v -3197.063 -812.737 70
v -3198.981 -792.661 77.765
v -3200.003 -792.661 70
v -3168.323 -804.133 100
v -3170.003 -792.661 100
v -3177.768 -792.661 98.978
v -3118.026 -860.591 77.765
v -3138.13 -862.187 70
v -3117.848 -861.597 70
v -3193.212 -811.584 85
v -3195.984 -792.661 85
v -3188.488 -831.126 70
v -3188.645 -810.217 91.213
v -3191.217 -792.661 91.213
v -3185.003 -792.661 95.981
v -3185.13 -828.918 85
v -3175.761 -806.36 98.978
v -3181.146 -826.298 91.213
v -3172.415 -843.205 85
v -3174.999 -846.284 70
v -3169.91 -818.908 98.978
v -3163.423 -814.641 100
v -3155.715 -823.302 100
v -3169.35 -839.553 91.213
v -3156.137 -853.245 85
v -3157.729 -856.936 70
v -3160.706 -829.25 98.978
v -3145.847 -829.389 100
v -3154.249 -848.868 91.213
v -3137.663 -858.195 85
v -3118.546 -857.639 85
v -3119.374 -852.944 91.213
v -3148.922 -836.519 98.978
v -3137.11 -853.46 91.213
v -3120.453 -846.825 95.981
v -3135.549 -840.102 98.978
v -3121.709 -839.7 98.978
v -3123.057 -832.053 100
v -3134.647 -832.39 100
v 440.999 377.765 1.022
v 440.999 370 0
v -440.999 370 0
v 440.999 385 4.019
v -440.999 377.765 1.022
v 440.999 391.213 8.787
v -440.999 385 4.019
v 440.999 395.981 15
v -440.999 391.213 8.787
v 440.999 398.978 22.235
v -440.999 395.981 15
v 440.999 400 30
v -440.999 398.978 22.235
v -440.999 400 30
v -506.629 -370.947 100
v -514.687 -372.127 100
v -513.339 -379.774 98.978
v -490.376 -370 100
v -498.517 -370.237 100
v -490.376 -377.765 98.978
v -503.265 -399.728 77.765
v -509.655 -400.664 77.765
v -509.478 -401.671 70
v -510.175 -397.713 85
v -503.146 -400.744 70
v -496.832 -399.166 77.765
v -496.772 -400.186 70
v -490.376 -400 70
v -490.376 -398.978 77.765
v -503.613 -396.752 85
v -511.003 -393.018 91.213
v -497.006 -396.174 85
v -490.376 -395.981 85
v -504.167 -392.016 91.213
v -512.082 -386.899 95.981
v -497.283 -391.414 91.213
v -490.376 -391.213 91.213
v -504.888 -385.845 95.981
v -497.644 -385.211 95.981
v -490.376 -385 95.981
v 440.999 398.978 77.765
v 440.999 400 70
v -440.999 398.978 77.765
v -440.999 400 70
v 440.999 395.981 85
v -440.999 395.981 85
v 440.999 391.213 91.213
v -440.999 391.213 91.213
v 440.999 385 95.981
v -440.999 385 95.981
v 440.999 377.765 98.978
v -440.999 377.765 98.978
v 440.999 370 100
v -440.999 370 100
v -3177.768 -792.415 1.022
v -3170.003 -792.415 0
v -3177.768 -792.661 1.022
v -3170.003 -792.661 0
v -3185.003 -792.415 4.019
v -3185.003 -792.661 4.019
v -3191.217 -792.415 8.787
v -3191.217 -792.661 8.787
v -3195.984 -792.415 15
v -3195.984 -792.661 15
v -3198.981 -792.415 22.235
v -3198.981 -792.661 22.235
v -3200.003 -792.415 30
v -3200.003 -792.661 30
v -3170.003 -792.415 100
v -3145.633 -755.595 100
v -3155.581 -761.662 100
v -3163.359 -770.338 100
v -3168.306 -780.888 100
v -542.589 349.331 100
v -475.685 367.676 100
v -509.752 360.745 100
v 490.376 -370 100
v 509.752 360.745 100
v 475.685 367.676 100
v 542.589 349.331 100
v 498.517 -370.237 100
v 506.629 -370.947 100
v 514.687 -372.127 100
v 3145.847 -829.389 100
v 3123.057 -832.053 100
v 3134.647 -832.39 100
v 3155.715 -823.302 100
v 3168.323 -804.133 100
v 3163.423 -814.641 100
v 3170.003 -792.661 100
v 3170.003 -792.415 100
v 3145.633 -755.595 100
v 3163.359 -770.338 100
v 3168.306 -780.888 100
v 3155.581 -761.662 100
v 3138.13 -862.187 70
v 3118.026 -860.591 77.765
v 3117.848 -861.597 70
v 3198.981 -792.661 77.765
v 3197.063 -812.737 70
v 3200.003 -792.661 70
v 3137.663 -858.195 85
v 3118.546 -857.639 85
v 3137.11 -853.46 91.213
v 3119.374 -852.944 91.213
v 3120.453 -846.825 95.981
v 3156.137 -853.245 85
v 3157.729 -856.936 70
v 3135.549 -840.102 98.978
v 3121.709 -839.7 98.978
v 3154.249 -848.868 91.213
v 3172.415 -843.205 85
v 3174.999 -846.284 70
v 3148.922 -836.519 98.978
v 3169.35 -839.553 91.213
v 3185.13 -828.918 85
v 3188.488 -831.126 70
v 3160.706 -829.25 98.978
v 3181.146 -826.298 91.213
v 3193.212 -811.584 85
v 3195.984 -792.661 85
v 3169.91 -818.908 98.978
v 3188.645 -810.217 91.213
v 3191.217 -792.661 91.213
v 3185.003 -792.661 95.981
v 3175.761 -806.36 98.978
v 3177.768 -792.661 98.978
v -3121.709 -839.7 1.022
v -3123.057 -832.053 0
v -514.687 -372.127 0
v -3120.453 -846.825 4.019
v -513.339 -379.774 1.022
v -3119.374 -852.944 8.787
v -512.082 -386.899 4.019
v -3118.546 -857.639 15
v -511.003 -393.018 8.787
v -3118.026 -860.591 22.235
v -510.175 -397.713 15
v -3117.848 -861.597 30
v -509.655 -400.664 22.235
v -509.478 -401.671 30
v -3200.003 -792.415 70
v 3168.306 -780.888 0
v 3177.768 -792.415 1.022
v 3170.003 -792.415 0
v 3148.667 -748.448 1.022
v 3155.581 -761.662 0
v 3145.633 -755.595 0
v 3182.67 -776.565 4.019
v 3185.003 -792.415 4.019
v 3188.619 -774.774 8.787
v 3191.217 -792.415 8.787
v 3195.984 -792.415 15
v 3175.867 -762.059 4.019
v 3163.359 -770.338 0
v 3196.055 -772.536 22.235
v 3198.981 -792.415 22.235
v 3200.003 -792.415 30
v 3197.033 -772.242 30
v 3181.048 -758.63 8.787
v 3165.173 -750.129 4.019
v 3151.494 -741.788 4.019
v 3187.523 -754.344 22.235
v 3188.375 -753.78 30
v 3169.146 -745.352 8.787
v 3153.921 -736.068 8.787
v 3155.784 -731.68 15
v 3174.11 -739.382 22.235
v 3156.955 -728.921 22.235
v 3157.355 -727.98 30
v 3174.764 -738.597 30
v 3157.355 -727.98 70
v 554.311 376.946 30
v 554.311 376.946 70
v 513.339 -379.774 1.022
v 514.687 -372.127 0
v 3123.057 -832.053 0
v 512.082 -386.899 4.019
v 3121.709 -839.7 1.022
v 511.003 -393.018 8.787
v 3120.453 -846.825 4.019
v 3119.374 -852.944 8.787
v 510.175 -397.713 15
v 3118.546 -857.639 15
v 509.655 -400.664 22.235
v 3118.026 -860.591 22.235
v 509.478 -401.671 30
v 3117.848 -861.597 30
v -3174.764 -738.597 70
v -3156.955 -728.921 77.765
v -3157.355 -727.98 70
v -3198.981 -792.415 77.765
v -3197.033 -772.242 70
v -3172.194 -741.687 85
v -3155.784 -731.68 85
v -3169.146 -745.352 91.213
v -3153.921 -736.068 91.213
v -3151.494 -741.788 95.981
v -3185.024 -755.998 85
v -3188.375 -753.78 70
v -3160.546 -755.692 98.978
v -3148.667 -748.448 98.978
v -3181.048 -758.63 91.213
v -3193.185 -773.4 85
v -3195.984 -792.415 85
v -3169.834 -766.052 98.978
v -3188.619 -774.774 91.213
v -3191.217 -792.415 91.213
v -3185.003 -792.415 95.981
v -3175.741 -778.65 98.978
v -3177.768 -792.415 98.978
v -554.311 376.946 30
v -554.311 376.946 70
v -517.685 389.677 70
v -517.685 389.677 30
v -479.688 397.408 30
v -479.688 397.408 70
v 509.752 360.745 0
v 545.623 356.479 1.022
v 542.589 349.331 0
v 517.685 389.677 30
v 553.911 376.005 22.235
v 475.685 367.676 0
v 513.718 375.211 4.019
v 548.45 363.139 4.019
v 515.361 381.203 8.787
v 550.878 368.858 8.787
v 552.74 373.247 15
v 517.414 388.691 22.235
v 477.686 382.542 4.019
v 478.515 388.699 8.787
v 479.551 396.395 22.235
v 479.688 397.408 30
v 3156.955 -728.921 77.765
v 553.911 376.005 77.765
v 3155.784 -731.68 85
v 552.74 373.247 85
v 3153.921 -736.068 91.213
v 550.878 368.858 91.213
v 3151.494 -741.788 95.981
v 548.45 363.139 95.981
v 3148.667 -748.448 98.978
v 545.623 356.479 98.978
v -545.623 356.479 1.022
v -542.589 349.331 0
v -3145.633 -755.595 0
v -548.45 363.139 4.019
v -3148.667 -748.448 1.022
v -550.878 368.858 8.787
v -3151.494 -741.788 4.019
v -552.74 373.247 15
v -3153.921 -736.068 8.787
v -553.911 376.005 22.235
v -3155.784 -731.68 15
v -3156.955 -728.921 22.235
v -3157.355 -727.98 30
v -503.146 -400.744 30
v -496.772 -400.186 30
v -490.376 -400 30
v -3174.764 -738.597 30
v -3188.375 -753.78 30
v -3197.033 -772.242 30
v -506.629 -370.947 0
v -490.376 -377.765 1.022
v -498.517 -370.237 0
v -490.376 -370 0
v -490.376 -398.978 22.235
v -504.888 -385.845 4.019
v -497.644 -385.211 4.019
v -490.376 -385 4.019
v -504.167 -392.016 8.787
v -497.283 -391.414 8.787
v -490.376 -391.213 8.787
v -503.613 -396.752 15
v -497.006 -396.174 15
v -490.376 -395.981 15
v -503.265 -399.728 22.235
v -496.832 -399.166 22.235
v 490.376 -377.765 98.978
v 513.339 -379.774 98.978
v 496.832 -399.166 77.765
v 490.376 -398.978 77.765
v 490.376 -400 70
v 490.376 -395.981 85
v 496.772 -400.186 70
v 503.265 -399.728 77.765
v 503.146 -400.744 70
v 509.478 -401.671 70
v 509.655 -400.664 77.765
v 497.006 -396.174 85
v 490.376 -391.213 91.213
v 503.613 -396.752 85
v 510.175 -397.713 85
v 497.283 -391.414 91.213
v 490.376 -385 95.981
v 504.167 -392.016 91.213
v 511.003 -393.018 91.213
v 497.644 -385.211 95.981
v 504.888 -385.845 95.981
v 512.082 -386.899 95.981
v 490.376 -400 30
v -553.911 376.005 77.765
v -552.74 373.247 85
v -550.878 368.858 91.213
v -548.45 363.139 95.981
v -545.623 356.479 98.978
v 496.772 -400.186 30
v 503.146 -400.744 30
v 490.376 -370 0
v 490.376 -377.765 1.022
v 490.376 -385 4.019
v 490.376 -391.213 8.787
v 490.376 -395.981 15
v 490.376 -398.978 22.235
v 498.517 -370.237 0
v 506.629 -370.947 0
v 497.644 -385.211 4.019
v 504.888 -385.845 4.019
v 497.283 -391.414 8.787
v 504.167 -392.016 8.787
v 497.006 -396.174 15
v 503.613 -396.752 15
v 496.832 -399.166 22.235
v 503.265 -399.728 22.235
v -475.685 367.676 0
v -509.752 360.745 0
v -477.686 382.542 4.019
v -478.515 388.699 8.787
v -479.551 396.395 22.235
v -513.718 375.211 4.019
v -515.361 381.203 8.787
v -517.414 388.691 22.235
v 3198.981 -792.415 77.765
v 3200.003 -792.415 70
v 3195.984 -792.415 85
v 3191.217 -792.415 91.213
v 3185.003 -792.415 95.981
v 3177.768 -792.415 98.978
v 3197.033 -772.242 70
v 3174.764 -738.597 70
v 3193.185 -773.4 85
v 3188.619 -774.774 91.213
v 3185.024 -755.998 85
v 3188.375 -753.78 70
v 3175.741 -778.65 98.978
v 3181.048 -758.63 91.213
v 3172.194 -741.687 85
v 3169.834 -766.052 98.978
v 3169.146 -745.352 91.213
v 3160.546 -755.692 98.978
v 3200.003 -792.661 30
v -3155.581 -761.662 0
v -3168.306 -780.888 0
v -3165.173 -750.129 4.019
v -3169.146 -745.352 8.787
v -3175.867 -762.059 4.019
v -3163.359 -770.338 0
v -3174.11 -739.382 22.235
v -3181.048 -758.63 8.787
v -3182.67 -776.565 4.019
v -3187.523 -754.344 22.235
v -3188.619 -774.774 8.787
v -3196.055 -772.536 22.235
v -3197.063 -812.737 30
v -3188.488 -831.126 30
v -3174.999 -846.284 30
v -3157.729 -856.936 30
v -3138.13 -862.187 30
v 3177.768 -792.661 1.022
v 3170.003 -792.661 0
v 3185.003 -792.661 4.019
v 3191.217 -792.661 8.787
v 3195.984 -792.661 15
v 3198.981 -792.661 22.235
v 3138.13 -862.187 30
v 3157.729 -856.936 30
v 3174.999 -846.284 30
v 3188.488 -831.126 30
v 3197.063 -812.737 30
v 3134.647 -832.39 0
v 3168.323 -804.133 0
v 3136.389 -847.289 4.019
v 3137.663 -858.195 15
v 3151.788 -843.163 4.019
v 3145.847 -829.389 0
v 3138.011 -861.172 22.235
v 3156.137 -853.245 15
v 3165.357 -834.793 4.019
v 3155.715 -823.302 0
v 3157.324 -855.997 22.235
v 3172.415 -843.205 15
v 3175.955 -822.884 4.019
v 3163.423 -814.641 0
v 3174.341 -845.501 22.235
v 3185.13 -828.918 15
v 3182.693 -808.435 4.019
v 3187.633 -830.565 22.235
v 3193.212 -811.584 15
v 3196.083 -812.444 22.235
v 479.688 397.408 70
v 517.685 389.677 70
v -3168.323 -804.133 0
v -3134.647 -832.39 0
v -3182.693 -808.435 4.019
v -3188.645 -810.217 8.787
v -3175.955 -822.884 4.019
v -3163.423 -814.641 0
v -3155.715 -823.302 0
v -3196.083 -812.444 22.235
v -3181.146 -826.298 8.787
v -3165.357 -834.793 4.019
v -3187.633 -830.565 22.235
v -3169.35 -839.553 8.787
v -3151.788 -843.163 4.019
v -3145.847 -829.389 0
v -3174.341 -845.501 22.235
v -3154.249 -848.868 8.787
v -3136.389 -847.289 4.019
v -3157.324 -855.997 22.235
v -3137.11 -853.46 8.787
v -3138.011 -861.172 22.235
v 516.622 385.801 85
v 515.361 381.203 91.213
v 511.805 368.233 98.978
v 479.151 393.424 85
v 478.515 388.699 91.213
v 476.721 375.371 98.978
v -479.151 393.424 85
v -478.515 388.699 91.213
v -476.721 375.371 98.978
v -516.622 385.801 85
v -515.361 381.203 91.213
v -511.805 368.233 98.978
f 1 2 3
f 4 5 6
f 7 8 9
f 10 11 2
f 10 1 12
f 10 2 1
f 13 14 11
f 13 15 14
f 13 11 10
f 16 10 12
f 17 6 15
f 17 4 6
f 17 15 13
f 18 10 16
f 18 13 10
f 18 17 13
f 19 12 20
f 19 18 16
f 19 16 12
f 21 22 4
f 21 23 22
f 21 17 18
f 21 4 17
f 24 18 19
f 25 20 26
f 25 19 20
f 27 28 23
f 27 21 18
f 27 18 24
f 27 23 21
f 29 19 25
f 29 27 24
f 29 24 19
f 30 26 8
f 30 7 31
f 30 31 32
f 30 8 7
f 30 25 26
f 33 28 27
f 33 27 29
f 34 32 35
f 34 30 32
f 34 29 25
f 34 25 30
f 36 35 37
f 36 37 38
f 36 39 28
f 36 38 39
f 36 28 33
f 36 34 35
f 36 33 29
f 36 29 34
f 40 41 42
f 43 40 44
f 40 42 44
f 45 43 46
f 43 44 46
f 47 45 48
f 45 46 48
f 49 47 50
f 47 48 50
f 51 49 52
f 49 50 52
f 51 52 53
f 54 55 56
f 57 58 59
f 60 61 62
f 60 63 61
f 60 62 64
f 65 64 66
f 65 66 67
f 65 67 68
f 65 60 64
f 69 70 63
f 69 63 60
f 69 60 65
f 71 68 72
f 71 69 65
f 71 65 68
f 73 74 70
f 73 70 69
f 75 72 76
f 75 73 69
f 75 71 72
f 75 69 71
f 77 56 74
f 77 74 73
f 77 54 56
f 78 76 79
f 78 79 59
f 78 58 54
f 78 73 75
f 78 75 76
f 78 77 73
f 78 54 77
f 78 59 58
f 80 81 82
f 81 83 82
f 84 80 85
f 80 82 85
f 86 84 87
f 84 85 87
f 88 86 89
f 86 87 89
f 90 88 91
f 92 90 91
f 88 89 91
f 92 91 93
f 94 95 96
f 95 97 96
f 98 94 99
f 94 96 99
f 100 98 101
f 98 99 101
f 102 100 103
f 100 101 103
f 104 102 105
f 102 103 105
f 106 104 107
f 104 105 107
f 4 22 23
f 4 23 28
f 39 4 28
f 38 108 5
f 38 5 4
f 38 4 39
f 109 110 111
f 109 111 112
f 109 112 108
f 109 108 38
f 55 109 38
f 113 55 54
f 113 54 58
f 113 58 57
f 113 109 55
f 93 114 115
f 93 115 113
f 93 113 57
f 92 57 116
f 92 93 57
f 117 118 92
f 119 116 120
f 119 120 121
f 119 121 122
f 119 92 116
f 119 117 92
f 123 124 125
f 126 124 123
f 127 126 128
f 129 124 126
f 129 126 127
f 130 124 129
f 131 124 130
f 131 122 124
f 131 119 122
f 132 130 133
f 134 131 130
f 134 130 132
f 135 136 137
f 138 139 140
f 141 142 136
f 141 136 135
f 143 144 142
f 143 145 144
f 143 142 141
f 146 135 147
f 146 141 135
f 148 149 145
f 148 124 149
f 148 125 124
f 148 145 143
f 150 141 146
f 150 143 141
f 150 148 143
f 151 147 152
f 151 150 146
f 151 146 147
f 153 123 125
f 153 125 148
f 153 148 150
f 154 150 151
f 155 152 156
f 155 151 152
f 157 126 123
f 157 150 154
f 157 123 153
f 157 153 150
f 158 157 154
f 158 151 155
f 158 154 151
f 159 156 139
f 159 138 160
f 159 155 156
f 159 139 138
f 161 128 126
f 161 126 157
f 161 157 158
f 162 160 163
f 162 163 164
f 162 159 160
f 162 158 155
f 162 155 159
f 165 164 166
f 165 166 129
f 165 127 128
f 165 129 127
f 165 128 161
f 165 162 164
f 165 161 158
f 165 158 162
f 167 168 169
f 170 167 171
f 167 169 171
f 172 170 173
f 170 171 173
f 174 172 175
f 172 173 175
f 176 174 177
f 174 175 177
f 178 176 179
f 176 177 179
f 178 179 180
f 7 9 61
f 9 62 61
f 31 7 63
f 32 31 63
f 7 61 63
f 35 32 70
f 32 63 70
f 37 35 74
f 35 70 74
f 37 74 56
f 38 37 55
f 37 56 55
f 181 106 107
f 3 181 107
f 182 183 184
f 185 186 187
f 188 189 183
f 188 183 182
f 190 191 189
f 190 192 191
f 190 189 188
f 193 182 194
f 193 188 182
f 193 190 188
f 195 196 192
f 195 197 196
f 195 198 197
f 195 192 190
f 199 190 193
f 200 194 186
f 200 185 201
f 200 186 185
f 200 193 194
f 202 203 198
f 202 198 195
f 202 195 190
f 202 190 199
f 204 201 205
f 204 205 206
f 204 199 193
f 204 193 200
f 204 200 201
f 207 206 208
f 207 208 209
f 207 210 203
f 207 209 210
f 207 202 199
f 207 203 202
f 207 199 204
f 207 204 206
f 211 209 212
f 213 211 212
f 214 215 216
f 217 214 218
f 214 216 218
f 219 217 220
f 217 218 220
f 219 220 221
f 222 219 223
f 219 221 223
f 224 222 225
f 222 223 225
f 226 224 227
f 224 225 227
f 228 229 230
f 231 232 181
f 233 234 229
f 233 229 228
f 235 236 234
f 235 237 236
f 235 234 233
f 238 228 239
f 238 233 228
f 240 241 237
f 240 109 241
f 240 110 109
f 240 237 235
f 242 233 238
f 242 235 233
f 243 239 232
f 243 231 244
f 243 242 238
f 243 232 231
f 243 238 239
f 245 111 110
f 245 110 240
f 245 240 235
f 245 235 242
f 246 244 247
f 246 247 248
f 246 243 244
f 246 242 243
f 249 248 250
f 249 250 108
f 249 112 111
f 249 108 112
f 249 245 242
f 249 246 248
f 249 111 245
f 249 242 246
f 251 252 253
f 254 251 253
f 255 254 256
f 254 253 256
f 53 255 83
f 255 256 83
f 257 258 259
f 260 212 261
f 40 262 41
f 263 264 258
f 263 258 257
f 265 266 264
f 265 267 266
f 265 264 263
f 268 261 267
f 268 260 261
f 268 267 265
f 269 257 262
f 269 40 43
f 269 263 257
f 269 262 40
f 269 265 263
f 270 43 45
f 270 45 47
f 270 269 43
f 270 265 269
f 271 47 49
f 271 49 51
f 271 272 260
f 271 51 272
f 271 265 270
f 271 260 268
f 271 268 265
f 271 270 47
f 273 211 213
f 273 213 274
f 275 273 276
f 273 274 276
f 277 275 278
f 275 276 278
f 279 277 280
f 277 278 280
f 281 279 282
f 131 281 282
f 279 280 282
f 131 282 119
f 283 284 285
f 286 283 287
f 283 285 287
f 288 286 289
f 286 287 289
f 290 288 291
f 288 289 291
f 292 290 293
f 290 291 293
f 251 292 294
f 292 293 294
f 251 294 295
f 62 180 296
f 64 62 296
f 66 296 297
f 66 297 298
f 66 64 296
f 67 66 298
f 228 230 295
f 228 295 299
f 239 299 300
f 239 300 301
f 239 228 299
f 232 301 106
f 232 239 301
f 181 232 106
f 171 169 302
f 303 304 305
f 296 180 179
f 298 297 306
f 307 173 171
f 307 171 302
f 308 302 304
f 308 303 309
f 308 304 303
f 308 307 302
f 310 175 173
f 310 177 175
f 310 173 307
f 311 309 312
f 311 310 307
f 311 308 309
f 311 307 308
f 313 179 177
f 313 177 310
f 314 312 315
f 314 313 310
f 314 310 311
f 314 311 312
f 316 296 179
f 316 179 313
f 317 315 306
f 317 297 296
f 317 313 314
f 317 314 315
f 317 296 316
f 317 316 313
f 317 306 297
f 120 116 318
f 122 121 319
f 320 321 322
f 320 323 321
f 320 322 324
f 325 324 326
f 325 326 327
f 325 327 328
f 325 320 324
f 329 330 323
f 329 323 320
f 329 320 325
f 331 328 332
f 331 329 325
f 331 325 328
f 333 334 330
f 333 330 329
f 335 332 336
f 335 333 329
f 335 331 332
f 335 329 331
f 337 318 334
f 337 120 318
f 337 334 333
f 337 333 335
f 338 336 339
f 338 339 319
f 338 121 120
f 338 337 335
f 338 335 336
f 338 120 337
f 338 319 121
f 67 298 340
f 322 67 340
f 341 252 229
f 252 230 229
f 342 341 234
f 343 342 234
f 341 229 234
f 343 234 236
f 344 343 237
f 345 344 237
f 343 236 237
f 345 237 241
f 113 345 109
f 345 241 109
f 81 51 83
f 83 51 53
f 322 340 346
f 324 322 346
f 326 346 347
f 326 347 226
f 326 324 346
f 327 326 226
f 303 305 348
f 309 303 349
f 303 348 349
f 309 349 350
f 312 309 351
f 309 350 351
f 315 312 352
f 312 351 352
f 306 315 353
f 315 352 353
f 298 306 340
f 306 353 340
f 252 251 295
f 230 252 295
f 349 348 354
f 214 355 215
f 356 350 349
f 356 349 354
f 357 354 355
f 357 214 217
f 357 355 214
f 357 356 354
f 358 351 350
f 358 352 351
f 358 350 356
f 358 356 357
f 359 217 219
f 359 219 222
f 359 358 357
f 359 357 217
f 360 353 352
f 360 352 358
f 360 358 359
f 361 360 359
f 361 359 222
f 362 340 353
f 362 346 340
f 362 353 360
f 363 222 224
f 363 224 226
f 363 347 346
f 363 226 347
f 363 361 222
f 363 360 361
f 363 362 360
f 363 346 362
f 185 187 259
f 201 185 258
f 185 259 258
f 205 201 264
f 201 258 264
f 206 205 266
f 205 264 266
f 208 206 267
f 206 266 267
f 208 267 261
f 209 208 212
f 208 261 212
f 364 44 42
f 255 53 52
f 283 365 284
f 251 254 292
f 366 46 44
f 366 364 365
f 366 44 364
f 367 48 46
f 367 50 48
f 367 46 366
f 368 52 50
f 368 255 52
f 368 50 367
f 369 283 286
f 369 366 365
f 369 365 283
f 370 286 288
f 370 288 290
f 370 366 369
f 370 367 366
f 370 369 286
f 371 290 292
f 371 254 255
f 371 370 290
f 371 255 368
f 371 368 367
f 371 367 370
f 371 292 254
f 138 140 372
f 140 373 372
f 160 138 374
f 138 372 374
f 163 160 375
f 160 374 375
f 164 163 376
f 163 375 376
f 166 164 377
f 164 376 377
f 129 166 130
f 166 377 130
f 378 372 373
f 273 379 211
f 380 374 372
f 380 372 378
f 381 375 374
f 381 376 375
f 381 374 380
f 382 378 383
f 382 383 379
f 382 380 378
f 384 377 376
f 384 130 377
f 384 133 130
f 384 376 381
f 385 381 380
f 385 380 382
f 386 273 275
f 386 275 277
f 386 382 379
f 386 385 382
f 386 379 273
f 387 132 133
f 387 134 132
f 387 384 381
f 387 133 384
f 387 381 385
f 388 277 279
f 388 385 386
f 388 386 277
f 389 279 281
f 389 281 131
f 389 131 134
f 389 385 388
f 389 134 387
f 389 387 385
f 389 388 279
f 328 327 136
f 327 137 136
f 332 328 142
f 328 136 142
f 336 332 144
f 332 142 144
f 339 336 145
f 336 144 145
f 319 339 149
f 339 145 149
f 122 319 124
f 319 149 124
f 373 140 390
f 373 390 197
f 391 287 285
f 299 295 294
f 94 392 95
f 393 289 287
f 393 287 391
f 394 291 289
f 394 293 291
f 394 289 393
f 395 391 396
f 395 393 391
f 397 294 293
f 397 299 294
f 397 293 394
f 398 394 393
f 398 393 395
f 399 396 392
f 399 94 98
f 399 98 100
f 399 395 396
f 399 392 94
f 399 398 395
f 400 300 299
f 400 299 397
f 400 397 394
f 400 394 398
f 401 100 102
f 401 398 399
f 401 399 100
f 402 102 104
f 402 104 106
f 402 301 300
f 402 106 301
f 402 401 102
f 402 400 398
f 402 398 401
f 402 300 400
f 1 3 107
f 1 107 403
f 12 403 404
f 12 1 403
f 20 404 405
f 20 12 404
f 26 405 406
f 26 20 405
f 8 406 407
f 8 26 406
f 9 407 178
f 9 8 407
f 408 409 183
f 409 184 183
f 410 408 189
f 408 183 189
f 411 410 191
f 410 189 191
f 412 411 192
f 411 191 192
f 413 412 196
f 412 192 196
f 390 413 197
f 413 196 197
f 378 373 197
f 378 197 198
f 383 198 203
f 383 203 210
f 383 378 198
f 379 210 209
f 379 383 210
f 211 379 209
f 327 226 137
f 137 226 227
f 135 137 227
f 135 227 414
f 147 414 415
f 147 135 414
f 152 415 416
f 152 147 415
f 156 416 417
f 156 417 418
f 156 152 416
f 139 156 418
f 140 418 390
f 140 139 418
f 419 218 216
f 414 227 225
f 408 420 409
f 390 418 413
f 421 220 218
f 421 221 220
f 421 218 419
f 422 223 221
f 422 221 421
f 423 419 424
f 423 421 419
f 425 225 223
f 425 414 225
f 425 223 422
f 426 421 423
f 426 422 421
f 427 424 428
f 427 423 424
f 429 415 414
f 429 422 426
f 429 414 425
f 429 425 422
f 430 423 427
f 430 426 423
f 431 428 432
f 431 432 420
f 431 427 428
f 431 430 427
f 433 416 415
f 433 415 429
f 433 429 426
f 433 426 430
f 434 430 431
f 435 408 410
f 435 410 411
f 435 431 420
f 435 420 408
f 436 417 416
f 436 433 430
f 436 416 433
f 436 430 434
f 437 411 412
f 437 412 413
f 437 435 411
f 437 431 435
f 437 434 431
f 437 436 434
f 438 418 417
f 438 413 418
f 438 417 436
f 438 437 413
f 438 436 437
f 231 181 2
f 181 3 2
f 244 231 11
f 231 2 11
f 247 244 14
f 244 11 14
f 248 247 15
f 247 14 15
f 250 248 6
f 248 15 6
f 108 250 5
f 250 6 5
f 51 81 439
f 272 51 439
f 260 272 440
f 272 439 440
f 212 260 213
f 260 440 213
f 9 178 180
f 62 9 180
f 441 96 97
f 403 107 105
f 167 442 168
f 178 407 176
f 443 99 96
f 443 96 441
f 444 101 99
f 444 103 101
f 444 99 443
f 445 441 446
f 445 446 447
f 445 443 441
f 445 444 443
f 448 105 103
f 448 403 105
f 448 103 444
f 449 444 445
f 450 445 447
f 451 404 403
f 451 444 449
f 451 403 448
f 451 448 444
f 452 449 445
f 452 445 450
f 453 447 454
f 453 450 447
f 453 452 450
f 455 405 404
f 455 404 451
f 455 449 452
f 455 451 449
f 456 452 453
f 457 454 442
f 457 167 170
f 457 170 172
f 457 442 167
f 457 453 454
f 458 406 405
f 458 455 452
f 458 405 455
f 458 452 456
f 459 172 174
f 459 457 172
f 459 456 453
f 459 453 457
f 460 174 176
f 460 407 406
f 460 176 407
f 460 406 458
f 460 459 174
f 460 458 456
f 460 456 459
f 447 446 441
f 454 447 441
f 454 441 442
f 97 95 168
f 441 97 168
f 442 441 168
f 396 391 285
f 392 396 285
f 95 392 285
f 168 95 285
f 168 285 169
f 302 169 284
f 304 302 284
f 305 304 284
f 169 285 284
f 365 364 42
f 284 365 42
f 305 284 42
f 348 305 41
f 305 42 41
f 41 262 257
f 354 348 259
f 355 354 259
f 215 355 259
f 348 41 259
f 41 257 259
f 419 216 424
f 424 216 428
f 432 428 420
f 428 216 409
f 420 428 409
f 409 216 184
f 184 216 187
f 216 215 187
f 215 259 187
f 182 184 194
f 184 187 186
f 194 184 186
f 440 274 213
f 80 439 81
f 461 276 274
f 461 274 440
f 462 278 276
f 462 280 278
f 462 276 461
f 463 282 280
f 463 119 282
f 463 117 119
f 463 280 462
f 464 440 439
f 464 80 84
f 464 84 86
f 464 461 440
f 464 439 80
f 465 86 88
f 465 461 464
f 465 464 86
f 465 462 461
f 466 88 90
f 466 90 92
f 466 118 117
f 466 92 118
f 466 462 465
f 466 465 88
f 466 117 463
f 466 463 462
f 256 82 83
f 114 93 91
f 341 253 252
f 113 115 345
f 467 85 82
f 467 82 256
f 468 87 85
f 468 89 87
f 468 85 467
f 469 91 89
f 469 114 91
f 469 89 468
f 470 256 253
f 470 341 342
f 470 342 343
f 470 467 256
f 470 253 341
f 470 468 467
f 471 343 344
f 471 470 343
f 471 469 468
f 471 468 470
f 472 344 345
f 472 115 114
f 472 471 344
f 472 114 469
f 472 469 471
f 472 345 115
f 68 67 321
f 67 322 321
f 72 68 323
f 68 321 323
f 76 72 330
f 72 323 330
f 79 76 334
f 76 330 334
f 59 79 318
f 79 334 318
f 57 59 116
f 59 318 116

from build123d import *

# Parameters (mm, degrees)
BOSS_EXTRU_1_DEPTH = 100
CONG_1_R           = 70
CONG_2_R           = 110
CONG_3_R           = 290
CONG_4_R           = 30
CONG_5_R           = 30


with BuildPart() as part:
    # Esquisse1 → Boss.-Extru.1 (new body)
    with BuildSketch(Plane.XY):
        Polygon((-500, 400), (-3200.00340179, -746.08344774), (-3200.00340179, -876.08344774), (-500, -400), (500, -400), (3200.00340179, -876.08344774), (3200.00340179, -746.08344774), (500, 400), align=None)
    extrude(amount=BOSS_EXTRU_1_DEPTH)

    # Congé1
    cong_1_edges = [part.edges().sort_by_distance(p)[0] for p in [
        (3200.00340179, -746.08344774, 50),
        (3200.00340179, -876.08344774, 50),
        (-3200.00340179, -876.08344774, 50),
        (-3200.00340179, -746.08344774, 50),
    ]]
    fillet(cong_1_edges, radius=CONG_1_R)

    # Congé2
    cong_2_edges = [part.edges().sort_by_distance(p)[0] for p in [
        (500, -400, 50),
        (-500, -400, 50),
    ]]
    fillet(cong_2_edges, radius=CONG_2_R)

    # Congé3
    cong_3_edges = [part.edges().sort_by_distance(p)[0] for p in [
        (-500, 400, 50),
        (500, 400, 50),
    ]]
    fillet(cong_3_edges, radius=CONG_3_R)

    # Congé4
    cong_4_edges = [part.edges().sort_by_distance(p)[0] for p in [
        (3200.00340179, -792.538066641, 100),
        (1855.832720607, -175.516844891, 100),
        (-3200.00340179, -792.538066641, 100),
        (-1813.662787955, -631.634193069, 100),
        (-3188.375409335, -753.779848052, 100),
        (-3174.998534468, -846.283807277, 100),
        (3188.375409335, -753.779848052, 100),
        (3174.998534468, -846.283807277, 100),
        (0, -400, 100),
        (1813.662787955, -631.634193069, 100),
        (-499.963378714, -400.41858321, 100),
        (499.963378714, -400.41858321, 100),
        (-1855.832720607, -175.516844891, 100),
        (0, 400, 100),
        (498.815534148, 394.17816434, 100),
        (-498.815534148, 394.17816434, 100),
    ]]
    fillet(cong_4_edges, radius=CONG_4_R)

    # Congé5
    cong_5_edges = [part.edges().sort_by_distance(p)[0] for p in [
        (3200.00340179, -792.538066641, 0),
        (1855.832720607, -175.516844891, 0),
        (-1813.662787955, -631.634193069, 0),
        (-3200.00340179, -792.538066641, 0),
        (-3188.375409335, -753.779848052, 0),
        (-3174.998534468, -846.283807277, 0),
        (3188.375409335, -753.779848052, 0),
        (3174.998534468, -846.283807277, 0),
        (0, -400, 0),
        (1813.662787955, -631.634193069, 0),
        (-499.963378714, -400.41858321, 0),
        (499.963378714, -400.41858321, 0),
        (-1855.832720607, -175.516844891, 0),
        (0, 400, 0),
        (498.815534148, 394.17816434, 0),
        (-498.815534148, 394.17816434, 0),
    ]]
    fillet(cong_5_edges, radius=CONG_5_R)


solid = part.part
